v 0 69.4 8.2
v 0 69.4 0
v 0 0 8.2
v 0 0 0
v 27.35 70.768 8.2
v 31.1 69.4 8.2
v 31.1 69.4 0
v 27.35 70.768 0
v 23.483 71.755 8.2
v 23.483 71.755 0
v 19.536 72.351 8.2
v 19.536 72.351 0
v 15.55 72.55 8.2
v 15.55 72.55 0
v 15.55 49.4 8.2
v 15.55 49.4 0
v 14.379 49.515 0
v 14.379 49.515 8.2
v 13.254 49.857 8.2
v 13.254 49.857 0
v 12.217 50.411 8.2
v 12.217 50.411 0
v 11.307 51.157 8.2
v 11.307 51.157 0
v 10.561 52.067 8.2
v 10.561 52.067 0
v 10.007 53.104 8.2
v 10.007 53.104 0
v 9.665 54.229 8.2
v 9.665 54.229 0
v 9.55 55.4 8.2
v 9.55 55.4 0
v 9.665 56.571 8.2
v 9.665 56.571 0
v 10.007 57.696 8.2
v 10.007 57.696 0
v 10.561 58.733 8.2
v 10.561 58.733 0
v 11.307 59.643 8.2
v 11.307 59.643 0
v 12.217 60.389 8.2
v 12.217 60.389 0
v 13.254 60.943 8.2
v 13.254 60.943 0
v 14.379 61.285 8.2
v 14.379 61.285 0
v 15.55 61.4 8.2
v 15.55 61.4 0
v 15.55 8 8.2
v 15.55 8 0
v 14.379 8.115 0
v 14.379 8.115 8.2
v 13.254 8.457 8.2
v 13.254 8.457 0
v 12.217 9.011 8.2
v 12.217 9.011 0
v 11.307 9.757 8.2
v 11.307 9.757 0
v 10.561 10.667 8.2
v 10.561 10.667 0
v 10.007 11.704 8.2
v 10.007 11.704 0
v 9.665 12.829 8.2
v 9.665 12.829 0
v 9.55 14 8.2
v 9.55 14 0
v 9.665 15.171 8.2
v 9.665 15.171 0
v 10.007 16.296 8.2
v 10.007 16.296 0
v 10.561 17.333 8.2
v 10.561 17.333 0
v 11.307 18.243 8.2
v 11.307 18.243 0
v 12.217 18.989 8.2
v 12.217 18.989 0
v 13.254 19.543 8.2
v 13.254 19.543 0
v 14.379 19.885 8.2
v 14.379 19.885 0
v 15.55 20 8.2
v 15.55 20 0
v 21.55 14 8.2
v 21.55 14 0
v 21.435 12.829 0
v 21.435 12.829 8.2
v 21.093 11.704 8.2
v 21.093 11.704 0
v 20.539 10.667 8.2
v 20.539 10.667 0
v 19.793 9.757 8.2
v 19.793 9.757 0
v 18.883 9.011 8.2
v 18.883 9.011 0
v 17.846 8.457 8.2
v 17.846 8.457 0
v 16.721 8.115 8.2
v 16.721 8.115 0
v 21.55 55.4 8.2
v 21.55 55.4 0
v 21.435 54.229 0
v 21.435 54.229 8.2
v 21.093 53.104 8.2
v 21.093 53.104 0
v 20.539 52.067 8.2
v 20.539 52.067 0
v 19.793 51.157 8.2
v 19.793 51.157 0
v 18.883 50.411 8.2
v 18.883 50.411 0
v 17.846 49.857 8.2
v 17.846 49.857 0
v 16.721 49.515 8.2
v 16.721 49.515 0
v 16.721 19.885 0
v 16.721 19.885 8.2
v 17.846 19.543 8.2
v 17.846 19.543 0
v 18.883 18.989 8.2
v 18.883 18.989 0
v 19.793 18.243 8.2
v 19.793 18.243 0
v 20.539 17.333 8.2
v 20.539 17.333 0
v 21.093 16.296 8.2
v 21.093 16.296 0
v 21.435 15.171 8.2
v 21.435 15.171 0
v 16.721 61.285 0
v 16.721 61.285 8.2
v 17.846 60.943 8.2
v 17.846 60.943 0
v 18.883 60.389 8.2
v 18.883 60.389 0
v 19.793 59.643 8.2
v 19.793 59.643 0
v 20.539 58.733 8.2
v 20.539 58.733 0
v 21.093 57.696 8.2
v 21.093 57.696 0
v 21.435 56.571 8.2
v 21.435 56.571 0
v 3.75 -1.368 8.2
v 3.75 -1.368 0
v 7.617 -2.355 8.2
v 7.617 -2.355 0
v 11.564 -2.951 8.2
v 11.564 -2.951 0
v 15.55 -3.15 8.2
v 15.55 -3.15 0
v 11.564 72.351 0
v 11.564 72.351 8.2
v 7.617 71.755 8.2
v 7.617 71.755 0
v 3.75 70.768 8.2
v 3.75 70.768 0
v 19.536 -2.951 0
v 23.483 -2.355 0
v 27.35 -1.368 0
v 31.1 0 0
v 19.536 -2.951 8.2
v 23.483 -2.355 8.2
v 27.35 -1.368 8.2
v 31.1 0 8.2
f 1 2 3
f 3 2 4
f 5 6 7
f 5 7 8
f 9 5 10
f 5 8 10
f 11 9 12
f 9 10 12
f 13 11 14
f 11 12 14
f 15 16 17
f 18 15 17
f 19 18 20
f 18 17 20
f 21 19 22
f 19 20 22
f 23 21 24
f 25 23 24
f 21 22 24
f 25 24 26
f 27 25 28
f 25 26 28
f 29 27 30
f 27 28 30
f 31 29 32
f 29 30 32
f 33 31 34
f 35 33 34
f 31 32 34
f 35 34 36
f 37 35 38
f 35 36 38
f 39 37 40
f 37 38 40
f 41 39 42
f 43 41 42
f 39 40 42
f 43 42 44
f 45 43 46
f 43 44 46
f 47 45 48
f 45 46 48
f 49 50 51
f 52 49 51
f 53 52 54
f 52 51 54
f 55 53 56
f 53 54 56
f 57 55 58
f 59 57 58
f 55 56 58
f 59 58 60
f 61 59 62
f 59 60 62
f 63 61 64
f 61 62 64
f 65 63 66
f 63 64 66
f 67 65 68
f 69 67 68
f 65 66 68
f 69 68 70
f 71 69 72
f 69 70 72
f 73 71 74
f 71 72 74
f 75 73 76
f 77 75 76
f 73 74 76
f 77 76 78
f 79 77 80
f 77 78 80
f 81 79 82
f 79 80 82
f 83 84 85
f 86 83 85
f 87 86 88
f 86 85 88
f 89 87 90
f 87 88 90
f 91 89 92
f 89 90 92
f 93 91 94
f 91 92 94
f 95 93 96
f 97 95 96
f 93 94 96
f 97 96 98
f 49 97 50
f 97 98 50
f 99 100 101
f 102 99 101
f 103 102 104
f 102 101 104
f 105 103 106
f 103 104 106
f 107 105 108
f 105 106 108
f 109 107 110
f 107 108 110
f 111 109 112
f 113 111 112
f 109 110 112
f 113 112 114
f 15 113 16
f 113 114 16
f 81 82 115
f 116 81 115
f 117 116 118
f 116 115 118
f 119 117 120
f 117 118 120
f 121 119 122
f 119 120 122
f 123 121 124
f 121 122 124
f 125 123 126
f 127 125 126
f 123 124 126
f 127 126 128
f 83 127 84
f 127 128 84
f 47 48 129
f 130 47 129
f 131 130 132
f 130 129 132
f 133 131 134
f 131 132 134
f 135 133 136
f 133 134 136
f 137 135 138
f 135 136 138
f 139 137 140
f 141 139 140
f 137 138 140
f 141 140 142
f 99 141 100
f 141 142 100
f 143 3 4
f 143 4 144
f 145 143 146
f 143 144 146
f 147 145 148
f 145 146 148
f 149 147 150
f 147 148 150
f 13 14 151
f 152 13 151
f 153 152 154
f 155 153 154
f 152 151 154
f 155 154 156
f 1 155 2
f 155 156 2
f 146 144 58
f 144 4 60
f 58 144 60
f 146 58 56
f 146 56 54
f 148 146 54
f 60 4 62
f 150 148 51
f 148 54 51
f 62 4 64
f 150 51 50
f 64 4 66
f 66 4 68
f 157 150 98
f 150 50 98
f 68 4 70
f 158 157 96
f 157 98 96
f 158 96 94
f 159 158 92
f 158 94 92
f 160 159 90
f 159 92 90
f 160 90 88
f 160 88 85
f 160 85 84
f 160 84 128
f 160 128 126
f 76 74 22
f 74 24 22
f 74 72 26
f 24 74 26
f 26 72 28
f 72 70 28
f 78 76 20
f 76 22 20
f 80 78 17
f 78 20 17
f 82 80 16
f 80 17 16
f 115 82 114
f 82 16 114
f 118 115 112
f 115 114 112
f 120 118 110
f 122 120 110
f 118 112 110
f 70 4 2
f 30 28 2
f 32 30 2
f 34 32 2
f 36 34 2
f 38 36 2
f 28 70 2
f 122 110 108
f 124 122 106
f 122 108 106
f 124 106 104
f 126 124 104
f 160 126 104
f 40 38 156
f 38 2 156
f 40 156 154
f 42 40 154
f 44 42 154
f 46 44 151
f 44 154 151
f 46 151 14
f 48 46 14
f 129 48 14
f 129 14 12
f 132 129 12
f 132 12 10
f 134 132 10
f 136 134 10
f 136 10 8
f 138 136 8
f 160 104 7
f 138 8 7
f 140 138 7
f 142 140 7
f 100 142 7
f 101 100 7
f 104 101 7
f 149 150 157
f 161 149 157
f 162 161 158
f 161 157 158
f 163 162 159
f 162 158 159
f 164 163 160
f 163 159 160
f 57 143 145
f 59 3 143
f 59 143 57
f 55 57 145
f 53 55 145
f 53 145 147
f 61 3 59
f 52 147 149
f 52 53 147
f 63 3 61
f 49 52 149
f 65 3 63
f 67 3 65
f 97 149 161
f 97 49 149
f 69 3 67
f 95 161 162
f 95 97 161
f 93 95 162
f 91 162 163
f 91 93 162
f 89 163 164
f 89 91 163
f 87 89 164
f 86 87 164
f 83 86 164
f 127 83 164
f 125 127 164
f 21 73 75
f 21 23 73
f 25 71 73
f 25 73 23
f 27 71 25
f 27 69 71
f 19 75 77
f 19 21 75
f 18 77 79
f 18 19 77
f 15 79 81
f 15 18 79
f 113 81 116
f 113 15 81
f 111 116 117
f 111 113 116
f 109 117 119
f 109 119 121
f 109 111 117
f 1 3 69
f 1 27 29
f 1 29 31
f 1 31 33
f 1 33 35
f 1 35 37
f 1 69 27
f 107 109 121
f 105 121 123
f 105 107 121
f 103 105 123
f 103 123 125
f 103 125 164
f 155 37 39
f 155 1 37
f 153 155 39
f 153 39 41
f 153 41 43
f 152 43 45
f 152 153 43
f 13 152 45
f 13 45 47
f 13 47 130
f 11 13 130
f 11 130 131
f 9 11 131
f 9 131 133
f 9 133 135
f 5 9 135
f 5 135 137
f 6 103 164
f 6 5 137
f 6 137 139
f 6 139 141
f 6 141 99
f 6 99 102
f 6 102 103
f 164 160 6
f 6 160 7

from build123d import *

# Parameters (mm, degrees)
SALIENTE_EXTRUIR2_DEPTH = 8.2


with BuildPart() as part:
    # Croquis1 → Saliente-Extruir2 (new body)
    with BuildSketch(Plane.XY):
        with BuildLine():
            Line((0, 69.4), (0, 34.7))
            Line((0, 34.7), (15.55, 34.7))
            Line((15.55, 34.7), (15.55, 49.4))
            ThreePointArc((15.55, 49.4), (9.55, 55.4), (15.55, 61.4))
            Line((15.55, 61.4), (15.55, 72.55))
            ThreePointArc((15.55, 72.55), (7.617078092, 71.754582753), (0, 69.4))
        make_face()
        with BuildLine():
            Line((15.55, 49.4), (15.55, 34.7))
            Line((15.55, 34.7), (31.1, 34.7))
            Line((31.1, 34.7), (31.1, 69.4))
            ThreePointArc((31.1, 69.4), (23.482921908, 71.754582753), (15.55, 72.55))
            Line((15.55, 72.55), (15.55, 61.4))
            ThreePointArc((15.55, 61.4), (19.792640687, 59.642640687), (21.55, 55.4))
            ThreePointArc((21.55, 55.4), (19.792640687, 51.157359313), (15.55, 49.4))
        make_face()
        with BuildLine():
            Line((0, 34.7), (0, 0))
            ThreePointArc((0, 0), (7.617078092, -2.354582753), (15.55, -3.15))
            Line((15.55, -3.15), (15.55, 8))
            ThreePointArc((15.55, 8), (9.55, 14), (15.55, 20))
            Line((15.55, 20), (15.55, 34.7))
            Line((15.55, 34.7), (0, 34.7))
        make_face()
        with BuildLine():
            Line((15.55, 8), (15.55, -3.15))
            ThreePointArc((15.55, -3.15), (23.482921908, -2.354582753), (31.1, 0))
            Line((31.1, 0), (31.1, 34.7))
            Line((31.1, 34.7), (15.55, 34.7))
            Line((15.55, 34.7), (15.55, 20))
            ThreePointArc((15.55, 20), (19.792640687, 18.242640687), (21.55, 14))
            ThreePointArc((21.55, 14), (19.792640687, 9.757359313), (15.55, 8))
        make_face()
    extrude(amount=SALIENTE_EXTRUIR2_DEPTH)


solid = part.part
